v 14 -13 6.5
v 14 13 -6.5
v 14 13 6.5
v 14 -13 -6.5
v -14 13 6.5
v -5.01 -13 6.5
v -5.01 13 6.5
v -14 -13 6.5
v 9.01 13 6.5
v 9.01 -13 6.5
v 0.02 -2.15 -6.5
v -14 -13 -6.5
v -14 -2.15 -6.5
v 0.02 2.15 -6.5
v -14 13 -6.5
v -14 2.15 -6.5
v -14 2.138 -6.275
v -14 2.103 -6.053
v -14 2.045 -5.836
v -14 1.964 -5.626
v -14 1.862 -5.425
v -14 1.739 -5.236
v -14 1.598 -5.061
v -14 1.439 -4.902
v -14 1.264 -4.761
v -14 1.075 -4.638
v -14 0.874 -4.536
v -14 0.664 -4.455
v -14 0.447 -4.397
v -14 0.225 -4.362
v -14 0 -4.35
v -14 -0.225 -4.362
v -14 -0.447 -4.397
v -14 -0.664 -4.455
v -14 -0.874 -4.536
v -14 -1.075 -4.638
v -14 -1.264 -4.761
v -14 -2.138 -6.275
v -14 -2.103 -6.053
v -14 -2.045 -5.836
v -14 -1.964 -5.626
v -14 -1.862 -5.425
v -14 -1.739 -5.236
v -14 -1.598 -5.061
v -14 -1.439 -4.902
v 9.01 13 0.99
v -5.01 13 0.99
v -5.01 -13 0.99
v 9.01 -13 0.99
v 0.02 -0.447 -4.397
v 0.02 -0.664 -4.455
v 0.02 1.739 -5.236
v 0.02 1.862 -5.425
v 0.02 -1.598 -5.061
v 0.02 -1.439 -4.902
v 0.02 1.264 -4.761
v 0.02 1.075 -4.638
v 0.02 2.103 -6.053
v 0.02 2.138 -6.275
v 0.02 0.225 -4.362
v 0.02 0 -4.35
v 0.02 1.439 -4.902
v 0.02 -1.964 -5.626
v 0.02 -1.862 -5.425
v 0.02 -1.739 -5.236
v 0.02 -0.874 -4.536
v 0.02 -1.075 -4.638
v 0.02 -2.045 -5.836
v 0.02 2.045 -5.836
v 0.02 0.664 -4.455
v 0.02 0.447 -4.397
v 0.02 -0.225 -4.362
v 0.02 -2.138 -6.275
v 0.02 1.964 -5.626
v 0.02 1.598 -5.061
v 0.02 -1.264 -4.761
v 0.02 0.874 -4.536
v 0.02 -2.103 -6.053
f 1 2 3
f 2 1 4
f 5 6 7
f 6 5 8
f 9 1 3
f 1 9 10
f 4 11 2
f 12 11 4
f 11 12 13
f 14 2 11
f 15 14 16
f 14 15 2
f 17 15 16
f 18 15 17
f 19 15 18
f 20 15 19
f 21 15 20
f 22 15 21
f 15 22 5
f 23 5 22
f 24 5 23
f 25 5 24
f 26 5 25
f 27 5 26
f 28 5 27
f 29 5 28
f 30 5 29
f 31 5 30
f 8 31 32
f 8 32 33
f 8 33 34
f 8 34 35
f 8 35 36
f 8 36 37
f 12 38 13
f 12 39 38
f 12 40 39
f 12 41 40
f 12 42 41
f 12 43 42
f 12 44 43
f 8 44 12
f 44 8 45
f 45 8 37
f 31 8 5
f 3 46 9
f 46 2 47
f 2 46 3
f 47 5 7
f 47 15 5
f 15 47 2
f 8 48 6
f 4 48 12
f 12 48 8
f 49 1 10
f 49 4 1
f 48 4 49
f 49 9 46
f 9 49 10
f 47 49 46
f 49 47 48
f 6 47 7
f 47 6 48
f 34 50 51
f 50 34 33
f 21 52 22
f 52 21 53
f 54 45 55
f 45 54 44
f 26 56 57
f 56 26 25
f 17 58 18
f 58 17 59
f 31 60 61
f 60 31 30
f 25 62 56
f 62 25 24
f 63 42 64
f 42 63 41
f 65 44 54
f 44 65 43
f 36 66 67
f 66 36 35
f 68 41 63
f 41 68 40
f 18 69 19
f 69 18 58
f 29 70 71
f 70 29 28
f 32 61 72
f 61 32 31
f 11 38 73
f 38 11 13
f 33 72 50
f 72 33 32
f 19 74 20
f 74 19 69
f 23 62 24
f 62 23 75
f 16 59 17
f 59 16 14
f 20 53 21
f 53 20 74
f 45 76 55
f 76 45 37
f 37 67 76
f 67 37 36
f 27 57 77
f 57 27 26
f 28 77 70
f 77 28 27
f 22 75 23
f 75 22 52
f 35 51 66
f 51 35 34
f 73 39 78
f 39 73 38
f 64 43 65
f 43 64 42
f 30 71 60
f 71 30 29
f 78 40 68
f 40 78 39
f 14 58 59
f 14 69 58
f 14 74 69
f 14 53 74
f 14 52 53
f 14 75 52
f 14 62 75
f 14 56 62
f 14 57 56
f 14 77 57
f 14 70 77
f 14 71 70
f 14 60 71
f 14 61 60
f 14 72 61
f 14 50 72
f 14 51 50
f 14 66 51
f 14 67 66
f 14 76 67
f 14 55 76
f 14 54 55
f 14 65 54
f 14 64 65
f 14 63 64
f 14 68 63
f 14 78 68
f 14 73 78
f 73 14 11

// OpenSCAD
// Snap panel clip with a U-shaped panel slot.
$fn = 60;
eps = 0.02;
panel_t = 5;
clip_w = 26;
clip_l = 28;
clip_h = panel_t + 8;
slot = panel_t + 0.5;
difference() {
    cube([clip_l,clip_w,clip_h],center=true);
    translate([2,0,clip_h/2-slot/2]) cube([clip_l/2+eps,clip_w+2*eps,slot+eps],center=true);
    translate([-clip_l/2-eps,0,-clip_h/2]) rotate([0,90,0]) cylinder(d=4.3,h=clip_l/2+2*eps);
}
